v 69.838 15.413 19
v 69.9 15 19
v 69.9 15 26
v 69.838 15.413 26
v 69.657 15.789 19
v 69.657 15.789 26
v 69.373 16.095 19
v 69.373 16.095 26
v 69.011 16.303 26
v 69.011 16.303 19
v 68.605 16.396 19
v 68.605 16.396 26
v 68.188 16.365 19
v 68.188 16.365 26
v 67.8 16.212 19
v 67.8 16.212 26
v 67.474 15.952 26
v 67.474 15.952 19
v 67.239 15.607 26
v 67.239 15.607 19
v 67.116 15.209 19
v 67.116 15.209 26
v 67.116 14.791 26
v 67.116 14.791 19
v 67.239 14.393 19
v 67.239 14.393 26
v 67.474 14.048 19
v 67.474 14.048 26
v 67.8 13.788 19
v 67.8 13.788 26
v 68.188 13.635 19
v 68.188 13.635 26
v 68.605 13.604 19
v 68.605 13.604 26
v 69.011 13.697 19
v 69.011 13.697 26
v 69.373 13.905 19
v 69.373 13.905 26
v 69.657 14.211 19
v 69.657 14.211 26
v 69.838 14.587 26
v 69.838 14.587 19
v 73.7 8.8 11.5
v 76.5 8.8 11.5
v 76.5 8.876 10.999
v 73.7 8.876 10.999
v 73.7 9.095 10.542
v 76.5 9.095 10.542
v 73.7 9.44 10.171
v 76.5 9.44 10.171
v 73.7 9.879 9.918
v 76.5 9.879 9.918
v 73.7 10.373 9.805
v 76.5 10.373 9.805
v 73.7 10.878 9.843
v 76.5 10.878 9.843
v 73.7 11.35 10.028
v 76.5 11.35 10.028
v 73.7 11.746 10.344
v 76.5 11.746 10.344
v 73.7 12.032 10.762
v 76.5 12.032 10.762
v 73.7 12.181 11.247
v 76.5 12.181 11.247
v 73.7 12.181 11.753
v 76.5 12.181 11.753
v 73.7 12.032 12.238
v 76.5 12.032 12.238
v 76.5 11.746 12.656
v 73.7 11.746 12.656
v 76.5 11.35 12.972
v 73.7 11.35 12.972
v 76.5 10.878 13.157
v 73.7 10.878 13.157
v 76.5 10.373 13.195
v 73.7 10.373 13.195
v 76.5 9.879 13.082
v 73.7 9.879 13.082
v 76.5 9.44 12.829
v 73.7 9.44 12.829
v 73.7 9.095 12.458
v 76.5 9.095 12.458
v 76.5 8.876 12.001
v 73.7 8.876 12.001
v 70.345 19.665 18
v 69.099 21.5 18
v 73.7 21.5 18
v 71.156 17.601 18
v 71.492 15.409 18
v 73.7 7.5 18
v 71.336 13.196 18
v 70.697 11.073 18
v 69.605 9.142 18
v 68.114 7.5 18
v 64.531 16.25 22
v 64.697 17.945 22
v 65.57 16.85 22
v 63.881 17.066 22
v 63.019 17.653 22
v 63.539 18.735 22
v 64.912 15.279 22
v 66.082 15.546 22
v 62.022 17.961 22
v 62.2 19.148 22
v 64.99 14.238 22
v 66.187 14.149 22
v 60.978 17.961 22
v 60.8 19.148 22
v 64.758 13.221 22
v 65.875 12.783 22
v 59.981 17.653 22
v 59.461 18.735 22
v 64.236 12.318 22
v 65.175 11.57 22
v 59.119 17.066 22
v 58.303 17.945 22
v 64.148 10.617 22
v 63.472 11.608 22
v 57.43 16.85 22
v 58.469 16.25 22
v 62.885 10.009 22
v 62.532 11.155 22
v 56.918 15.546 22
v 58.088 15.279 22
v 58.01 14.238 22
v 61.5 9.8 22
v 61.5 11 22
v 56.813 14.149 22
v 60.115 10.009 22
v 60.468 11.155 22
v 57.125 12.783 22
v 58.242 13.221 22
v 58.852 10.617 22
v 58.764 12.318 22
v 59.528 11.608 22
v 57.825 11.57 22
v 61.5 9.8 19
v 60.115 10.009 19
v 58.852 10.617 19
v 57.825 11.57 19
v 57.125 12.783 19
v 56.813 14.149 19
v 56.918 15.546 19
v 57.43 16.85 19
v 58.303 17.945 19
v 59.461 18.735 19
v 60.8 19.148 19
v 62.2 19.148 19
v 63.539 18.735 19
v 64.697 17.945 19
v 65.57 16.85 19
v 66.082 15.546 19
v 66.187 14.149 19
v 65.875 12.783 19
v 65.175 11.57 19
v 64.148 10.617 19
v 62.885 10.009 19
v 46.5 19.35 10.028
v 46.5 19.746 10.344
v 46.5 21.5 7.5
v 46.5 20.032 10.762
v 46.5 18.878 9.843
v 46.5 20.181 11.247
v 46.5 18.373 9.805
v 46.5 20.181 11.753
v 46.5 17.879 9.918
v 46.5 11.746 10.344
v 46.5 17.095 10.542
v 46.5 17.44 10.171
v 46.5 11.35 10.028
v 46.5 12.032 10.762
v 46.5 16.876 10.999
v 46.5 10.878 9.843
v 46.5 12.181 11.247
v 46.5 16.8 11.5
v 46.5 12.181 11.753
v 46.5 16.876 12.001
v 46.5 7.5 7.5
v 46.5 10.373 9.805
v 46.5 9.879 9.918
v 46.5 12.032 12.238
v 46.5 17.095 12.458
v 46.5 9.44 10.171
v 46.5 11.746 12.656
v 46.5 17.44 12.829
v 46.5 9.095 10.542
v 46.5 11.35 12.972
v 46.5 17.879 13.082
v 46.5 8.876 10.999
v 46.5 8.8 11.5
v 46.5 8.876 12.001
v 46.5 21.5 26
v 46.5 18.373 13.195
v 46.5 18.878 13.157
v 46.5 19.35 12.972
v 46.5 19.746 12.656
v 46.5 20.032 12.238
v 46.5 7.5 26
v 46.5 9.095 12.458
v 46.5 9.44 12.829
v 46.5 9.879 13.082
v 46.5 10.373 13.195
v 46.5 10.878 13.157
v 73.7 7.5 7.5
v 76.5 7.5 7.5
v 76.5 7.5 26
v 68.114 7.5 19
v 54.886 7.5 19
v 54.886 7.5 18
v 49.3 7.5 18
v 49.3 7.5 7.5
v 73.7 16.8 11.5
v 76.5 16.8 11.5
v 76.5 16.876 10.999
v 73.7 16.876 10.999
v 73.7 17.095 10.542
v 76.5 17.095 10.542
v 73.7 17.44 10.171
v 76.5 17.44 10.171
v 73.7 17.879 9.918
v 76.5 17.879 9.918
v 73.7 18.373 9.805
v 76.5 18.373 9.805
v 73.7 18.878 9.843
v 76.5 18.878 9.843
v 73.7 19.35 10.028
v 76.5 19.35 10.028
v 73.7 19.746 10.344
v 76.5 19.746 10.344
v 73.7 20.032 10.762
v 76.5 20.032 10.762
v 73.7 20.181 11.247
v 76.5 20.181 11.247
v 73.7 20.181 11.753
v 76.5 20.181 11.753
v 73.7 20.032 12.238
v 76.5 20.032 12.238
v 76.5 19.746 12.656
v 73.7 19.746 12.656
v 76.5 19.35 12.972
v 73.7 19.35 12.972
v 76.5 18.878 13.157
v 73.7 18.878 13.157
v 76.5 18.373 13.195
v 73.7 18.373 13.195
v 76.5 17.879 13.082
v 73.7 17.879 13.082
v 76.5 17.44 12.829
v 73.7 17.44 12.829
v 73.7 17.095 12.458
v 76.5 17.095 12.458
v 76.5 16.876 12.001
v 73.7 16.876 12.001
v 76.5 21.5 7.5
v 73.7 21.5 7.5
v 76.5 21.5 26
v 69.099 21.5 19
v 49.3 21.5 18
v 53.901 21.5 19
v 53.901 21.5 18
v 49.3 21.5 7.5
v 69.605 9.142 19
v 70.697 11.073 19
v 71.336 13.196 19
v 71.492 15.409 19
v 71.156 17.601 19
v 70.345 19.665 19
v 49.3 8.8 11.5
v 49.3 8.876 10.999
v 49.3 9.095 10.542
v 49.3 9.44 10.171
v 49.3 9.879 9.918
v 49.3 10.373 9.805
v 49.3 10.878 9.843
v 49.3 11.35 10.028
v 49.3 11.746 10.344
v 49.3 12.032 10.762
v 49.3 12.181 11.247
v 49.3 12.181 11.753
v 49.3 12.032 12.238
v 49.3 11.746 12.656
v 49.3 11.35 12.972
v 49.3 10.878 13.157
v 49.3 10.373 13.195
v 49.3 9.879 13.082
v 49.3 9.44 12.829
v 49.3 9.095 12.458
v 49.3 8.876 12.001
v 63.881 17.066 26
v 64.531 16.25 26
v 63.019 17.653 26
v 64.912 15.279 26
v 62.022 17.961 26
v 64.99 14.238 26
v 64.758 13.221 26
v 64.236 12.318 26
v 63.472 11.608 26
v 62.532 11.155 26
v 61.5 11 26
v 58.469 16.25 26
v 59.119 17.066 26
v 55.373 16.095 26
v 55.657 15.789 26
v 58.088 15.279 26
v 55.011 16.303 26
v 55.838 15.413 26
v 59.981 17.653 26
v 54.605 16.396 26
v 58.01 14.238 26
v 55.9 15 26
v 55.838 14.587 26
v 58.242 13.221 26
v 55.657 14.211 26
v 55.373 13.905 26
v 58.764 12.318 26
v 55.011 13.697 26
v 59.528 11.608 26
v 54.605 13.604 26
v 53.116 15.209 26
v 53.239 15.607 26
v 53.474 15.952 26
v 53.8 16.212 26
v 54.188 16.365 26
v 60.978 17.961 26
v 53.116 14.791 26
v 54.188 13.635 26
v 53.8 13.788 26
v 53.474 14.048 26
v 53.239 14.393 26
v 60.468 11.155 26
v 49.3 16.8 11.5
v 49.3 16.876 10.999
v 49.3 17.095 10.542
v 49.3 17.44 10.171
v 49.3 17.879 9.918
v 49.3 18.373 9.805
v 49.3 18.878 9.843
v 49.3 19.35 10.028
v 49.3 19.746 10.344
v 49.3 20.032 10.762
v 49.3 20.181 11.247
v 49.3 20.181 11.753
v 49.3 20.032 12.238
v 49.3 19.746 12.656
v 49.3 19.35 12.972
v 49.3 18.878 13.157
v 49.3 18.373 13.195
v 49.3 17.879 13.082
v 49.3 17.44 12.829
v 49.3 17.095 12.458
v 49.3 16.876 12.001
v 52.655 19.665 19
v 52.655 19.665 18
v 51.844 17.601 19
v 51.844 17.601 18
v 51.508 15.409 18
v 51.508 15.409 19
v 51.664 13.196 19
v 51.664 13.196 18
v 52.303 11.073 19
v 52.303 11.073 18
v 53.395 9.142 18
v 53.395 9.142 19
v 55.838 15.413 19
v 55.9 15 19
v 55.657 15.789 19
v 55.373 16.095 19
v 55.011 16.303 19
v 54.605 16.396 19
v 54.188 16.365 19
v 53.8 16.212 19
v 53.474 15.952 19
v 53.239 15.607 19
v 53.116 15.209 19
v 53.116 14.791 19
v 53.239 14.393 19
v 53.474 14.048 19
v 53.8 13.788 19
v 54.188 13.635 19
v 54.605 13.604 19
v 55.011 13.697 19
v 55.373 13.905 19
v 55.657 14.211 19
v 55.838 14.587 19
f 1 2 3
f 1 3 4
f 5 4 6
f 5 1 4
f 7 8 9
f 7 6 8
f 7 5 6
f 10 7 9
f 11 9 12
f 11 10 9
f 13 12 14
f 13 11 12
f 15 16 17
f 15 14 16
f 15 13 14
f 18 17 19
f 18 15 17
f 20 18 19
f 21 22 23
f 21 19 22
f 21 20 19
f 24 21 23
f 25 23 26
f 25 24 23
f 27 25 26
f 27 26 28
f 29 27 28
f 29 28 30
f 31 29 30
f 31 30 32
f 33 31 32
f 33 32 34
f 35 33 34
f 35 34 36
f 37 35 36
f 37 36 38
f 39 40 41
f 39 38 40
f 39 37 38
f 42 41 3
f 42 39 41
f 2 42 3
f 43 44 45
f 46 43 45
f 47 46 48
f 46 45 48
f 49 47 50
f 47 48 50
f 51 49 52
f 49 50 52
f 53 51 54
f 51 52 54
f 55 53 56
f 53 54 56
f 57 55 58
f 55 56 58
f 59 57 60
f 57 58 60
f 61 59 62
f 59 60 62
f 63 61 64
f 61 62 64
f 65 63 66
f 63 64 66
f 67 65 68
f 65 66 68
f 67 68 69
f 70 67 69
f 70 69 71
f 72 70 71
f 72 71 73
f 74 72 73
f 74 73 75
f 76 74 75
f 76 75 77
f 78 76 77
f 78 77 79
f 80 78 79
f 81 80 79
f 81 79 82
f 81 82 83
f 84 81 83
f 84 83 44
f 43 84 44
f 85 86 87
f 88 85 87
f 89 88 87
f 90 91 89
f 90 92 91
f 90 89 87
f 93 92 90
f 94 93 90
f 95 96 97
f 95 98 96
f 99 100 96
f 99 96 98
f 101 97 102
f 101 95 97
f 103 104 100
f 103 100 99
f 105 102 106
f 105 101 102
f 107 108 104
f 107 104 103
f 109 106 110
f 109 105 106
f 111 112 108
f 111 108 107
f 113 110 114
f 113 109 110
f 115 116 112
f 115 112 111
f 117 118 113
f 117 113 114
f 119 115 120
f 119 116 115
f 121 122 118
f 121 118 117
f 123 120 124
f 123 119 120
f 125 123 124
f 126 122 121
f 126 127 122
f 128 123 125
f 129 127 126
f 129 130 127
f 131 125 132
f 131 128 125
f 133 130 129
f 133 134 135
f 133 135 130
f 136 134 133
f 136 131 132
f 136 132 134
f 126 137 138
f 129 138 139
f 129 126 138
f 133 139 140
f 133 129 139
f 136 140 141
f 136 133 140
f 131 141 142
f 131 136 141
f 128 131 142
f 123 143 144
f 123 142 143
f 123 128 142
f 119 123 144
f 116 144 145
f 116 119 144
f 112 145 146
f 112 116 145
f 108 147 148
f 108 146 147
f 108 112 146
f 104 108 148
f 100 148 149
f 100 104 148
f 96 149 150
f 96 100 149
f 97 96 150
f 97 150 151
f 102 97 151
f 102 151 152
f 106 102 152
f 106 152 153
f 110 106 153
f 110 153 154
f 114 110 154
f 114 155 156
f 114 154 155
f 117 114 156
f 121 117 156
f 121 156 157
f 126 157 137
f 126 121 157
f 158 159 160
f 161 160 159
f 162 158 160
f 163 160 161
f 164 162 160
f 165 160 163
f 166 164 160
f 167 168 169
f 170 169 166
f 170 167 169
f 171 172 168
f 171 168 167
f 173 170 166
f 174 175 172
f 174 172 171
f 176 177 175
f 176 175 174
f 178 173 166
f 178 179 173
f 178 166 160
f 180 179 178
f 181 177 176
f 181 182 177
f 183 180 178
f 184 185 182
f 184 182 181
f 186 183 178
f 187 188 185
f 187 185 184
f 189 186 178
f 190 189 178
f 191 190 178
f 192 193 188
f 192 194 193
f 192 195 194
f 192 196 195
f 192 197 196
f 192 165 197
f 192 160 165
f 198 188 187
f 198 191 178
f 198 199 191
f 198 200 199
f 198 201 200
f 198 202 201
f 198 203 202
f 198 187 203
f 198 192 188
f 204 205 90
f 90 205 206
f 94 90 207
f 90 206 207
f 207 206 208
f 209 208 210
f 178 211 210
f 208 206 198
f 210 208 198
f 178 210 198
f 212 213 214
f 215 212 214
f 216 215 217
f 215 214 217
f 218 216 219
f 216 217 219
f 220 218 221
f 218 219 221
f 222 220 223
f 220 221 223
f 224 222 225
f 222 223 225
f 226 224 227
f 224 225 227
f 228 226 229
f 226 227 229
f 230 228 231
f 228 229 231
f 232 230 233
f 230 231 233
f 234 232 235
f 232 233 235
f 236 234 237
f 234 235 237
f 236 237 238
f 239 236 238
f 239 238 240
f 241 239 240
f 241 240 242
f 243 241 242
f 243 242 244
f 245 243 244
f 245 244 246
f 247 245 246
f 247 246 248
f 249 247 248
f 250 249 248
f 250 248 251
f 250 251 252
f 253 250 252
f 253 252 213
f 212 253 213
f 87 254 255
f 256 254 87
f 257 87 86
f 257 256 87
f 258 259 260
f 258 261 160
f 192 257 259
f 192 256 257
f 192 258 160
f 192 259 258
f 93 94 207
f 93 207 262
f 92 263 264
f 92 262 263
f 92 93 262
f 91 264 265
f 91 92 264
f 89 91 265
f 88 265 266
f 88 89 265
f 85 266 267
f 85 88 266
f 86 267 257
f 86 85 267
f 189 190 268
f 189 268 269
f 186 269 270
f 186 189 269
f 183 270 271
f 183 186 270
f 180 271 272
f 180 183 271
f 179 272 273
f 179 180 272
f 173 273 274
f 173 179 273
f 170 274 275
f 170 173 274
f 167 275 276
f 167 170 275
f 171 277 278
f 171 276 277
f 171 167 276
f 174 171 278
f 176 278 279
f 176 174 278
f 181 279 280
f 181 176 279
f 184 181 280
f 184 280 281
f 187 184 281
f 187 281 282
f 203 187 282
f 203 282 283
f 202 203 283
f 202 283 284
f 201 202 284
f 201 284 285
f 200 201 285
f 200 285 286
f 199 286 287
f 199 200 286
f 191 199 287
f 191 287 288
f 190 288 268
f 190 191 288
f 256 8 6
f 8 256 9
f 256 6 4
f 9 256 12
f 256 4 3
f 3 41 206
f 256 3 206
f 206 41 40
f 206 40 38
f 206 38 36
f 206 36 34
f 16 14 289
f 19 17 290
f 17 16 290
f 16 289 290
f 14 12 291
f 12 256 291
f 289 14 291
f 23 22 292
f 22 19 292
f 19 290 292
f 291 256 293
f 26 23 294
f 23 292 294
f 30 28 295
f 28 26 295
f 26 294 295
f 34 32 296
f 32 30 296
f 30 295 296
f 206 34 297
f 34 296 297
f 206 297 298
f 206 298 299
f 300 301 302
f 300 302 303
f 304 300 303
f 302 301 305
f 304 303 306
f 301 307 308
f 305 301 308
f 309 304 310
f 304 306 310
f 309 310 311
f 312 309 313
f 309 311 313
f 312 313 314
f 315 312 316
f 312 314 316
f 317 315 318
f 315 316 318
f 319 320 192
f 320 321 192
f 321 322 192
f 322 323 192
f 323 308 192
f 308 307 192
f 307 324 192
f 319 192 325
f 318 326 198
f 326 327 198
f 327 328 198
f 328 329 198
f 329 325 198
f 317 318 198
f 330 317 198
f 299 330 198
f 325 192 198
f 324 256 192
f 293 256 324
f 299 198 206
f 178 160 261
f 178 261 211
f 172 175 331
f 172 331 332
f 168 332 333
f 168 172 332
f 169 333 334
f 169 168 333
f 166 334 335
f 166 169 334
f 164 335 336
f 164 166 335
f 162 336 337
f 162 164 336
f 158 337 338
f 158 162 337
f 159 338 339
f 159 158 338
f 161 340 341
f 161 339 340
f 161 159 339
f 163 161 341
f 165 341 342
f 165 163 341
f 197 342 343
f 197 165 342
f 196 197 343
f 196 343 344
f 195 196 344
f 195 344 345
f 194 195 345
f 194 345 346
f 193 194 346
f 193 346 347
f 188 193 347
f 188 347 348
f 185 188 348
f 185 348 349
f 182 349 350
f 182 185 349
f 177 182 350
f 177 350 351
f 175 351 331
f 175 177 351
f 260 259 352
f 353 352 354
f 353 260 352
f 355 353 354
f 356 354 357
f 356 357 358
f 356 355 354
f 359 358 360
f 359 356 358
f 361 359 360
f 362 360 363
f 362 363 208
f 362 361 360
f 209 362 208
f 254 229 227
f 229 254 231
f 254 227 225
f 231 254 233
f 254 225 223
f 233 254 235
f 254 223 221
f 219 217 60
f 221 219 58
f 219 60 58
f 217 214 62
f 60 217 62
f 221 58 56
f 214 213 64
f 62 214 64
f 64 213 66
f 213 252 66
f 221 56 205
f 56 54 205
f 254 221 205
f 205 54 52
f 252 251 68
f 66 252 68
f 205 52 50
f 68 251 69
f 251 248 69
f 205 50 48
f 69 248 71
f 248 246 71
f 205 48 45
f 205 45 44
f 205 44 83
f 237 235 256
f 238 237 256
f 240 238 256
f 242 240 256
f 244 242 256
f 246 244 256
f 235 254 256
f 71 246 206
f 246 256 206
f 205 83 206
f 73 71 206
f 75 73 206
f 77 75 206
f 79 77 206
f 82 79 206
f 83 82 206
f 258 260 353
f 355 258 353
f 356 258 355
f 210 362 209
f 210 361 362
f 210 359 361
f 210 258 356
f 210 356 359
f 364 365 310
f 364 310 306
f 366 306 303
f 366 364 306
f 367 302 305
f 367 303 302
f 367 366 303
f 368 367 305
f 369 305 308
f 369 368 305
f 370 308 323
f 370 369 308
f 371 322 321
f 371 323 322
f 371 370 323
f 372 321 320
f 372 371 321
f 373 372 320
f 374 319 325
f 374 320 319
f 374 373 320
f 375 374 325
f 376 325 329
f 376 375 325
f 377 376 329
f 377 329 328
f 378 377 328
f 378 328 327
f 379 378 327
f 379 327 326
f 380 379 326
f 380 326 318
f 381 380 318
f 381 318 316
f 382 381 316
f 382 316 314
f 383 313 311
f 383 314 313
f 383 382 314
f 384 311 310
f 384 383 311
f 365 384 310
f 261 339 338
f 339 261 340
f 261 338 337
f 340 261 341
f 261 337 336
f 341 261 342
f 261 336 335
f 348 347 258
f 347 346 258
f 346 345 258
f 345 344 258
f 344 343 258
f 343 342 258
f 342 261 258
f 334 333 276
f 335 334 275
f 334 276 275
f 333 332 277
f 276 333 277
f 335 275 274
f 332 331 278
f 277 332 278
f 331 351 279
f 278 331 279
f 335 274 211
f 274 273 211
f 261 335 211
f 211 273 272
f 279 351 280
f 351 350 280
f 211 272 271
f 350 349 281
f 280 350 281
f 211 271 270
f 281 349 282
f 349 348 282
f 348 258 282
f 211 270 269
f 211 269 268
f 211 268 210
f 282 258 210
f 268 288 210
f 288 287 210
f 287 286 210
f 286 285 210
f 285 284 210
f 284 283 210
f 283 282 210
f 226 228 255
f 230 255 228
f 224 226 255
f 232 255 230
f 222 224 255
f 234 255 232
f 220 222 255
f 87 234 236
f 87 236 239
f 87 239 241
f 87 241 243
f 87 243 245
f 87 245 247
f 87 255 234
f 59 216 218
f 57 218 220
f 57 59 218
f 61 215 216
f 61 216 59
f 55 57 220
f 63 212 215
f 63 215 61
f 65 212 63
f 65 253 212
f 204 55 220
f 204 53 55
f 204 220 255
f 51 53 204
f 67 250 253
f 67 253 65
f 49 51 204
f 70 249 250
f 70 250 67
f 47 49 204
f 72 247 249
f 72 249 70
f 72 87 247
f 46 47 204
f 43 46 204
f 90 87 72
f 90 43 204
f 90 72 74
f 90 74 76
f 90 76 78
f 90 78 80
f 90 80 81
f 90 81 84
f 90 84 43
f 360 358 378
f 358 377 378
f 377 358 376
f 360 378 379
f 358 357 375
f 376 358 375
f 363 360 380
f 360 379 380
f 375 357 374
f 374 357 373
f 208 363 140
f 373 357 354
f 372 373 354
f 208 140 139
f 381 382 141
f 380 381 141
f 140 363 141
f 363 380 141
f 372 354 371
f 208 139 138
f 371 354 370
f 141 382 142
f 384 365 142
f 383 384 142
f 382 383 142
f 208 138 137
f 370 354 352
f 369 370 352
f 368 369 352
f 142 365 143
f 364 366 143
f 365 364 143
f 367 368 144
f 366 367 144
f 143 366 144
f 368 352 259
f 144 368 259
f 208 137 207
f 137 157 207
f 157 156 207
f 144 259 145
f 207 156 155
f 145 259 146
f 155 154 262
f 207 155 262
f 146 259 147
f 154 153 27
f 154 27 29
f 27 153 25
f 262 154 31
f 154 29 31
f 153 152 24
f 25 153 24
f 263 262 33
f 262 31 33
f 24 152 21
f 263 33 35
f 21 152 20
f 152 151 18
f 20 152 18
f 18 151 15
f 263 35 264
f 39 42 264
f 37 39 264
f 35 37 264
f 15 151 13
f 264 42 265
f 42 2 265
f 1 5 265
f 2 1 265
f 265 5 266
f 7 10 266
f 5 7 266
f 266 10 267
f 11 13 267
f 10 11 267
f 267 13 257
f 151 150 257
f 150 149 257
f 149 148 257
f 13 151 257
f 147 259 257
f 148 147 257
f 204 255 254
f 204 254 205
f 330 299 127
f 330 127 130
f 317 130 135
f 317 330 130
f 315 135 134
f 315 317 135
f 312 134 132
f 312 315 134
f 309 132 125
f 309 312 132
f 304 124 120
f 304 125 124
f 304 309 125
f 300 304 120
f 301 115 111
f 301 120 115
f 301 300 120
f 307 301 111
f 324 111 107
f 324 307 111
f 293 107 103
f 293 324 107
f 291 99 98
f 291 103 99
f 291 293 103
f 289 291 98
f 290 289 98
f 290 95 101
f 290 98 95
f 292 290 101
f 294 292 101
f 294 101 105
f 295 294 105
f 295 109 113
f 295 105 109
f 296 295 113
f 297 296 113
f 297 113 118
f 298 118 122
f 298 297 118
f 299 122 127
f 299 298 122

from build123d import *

# Parameters (mm, degrees)
CYLINDER276_R             = 10
CYLINDER276_DEPTH         = 30
CYLINDER110_R             = 3.5
CYLINDER110_DEPTH         = 30
CYLINDER109_R             = 4.7
CYLINDER109_DEPTH         = 30
FUSION080_ROLL_ANGLE      = 180
FUSION080_PLACEMENT_ANGLE = -90
CYLINDER269_R             = 1.4
CYLINDER269_DEPTH         = 50
CYLINDER268_R             = 1.4
CYLINDER268_DEPTH         = 50
CYLINDER030_R             = 1.7
CYLINDER030_DEPTH         = 19
CYLINDER030_ROLL_ANGLE    = 90
CYLINDER107_R             = 1.7
CYLINDER107_DEPTH         = 19
CYLINDER107_ROLL_ANGLE    = 90
CYLINDER108_R             = 1.7
CYLINDER108_DEPTH         = 19
CYLINDER108_ROLL_ANGLE    = 90
CYLINDER104_R             = 1.7
CYLINDER104_DEPTH         = 19
CYLINDER104_ROLL_ANGLE    = 90
BOX001012_W               = 14
BOX001012_H               = 2.8
BOX001012_DEPTH           = 11
BOX001011_W               = 14
BOX001011_H               = 2.8
BOX001011_DEPTH           = 11
BOX001010_W               = 14
BOX001010_H               = 30
BOX001010_DEPTH           = 8
CUT006_ROLL_ANGLE         = 180
CUT006_PLACEMENT_ANGLE    = -90


with BuildPart() as cylinder290:
    # Cylinder276 → Cylinder276 (new body)
    with BuildSketch(Plane(origin=(61.5, 15, -11), x_dir=(1, 0, 0), z_dir=(0, 0, 1))):
        Circle(CYLINDER276_R)
    extrude(amount=CYLINDER276_DEPTH)


with BuildPart() as cylinder116:
    # Cylinder110 → Cylinder110 (new body)
    with BuildSketch(Plane.XY.offset(-9)):
        Circle(CYLINDER110_R)
    extrude(amount=CYLINDER110_DEPTH)


with BuildPart() as bearing_nut:
    # Cylinder109 → Cylinder109 (new body)
    with BuildSketch(Plane.XY.offset(-4.5)):
        Circle(CYLINDER109_R)
    extrude(amount=CYLINDER109_DEPTH)

    # Fusion080: union Cylinder116
    add(cylinder116.part)


with BuildPart() as bearing_nut_1:
    # Fusion080 roll: moved
    add(bearing_nut.part.rotate(Axis((0, 0, 0), (1, 0, 0)), FUSION080_ROLL_ANGLE))


with BuildPart() as bearing_nut_2:
    # Fusion080 placement: moved
    add(bearing_nut_1.part.moved(Location((61.5, 14.5, 17.5))).rotate(Axis((61.5, 14.5, 17.5), (0, 0, 1)), FUSION080_PLACEMENT_ANGLE))


with BuildPart() as m3_studding026:
    # Cylinder269 → Cylinder269 (new body)
    with BuildSketch(Plane(origin=(68.5, 15, 2), x_dir=(1, 0, 0), z_dir=(0, 0, 1))):
        Circle(CYLINDER269_R)
    extrude(amount=CYLINDER269_DEPTH)


with BuildPart() as fusion112155:
    # Cylinder268 → Cylinder268 (new body)
    with BuildSketch(Plane(origin=(54.5, 15, 2), x_dir=(1, 0, 0), z_dir=(0, 0, 1))):
        Circle(CYLINDER268_R)
    extrude(amount=CYLINDER268_DEPTH)

    # Fusion112155: union m3-studding026
    add(m3_studding026.part)


with BuildPart() as cylinder030:
    # Cylinder030 → Cylinder030 (new body)
    with BuildSketch(Plane.XY):
        Circle(CYLINDER030_R)
    extrude(amount=CYLINDER030_DEPTH)


with BuildPart() as cylinder030_1:
    # Cylinder030 roll: moved
    add(cylinder030.part.rotate(Axis((0, 0, 0), (1, 0, 0)), CYLINDER030_ROLL_ANGLE))


with BuildPart() as cylinder030_2:
    # Cylinder030 placement: moved
    add(cylinder030_1.part.moved(Location((4, 24, 6))))


with BuildPart() as cylinder107:
    # Cylinder107 → Cylinder107 (new body)
    with BuildSketch(Plane.XY):
        Circle(CYLINDER107_R)
    extrude(amount=CYLINDER107_DEPTH)


with BuildPart() as cylinder107_1:
    # Cylinder107 roll: moved
    add(cylinder107.part.rotate(Axis((0, 0, 0), (1, 0, 0)), CYLINDER107_ROLL_ANGLE))


with BuildPart() as cylinder107_2:
    # Cylinder107 placement: moved
    add(cylinder107_1.part.moved(Location((4, 24, 6))))


with BuildPart() as part_mirroring013:
    # Part__Mirroring013: instance of Cylinder107
    add(cylinder107_2.part.mirror(Plane(origin=(0, 0, 0), x_dir=(1, 0, 0), z_dir=(0, 1, 0))))


with BuildPart() as cylinder108:
    # Cylinder108 → Cylinder108 (new body)
    with BuildSketch(Plane.XY):
        Circle(CYLINDER108_R)
    extrude(amount=CYLINDER108_DEPTH)


with BuildPart() as cylinder108_1:
    # Cylinder108 roll: moved
    add(cylinder108.part.rotate(Axis((0, 0, 0), (1, 0, 0)), CYLINDER108_ROLL_ANGLE))


with BuildPart() as cylinder108_2:
    # Cylinder108 placement: moved
    add(cylinder108_1.part.moved(Location((-4, 24, 6))))


with BuildPart() as part_mirroring014:
    # Part__Mirroring014: instance of Cylinder108
    add(cylinder108_2.part.mirror(Plane(origin=(0, 0, 0), x_dir=(1, 0, 0), z_dir=(0, 1, 0))))


with BuildPart() as m3_clear_a:
    # Cylinder104 → Cylinder104 (new body)
    with BuildSketch(Plane.XY):
        Circle(CYLINDER104_R)
    extrude(amount=CYLINDER104_DEPTH)


with BuildPart() as m3_clear_a_1:
    # Cylinder104 roll: moved
    add(m3_clear_a.part.rotate(Axis((0, 0, 0), (1, 0, 0)), CYLINDER104_ROLL_ANGLE))


with BuildPart() as m3_clear_a_2:
    # Cylinder104 placement: moved
    add(m3_clear_a_1.part.moved(Location((-4, 24, 6))))

    # Fusion063: union Cylinder030, Part__Mirroring013, Part__Mirroring014
    add(cylinder030_2.part)
    add(part_mirroring013.part)
    add(part_mirroring014.part)


with BuildPart() as cube051:
    # Box001012 → Box001012 (new body)
    with BuildSketch(Plane(origin=(-7, 12.2, -1), x_dir=(1, 0, 0), z_dir=(0, 0, 1))):
        with Locations((7, 1.4)):
            Rectangle(BOX001012_W, BOX001012_H)
    extrude(amount=BOX001012_DEPTH)


with BuildPart() as cube050:
    # Box001011 → Box001011 (new body)
    with BuildSketch(Plane(origin=(-7, -15, -1), x_dir=(1, 0, 0), z_dir=(0, 0, 1))):
        with Locations((7, 1.4)):
            Rectangle(BOX001011_W, BOX001011_H)
    extrude(amount=BOX001011_DEPTH)


with BuildPart() as bearing_clamp:
    # Box001010 → Box001010 (new body)
    with BuildSketch(Plane(origin=(-7, -15, -8.5), x_dir=(1, 0, 0), z_dir=(0, 0, 1))):
        with Locations((7, 15)):
            Rectangle(BOX001010_W, BOX001010_H)
    extrude(amount=BOX001010_DEPTH)

    # Fusion061: union Cube051, Cube050
    add(cube051.part)
    add(cube050.part)

    # Cut006: cut M3-clear-a
    add(m3_clear_a_2.part, mode=Mode.SUBTRACT)


with BuildPart() as bearing_clamp_1:
    # Cut006 roll: moved
    add(bearing_clamp.part.rotate(Axis((0, 0, 0), (1, 0, 0)), CUT006_ROLL_ANGLE))


with BuildPart() as bearing_clamp_2:
    # Cut006 placement: moved
    add(bearing_clamp_1.part.moved(Location((61.5, 14.5, 17.5))).rotate(Axis((61.5, 14.5, 17.5), (0, 0, 1)), CUT006_PLACEMENT_ANGLE))

    # Cut240: cut Fusion112155
    add(fusion112155.part, mode=Mode.SUBTRACT)

    # Cut241: cut bearing-nut
    add(bearing_nut_2.part, mode=Mode.SUBTRACT)

    # Cut252: cut Cylinder290
    add(cylinder290.part, mode=Mode.SUBTRACT)


solid = bearing_clamp_2.part
